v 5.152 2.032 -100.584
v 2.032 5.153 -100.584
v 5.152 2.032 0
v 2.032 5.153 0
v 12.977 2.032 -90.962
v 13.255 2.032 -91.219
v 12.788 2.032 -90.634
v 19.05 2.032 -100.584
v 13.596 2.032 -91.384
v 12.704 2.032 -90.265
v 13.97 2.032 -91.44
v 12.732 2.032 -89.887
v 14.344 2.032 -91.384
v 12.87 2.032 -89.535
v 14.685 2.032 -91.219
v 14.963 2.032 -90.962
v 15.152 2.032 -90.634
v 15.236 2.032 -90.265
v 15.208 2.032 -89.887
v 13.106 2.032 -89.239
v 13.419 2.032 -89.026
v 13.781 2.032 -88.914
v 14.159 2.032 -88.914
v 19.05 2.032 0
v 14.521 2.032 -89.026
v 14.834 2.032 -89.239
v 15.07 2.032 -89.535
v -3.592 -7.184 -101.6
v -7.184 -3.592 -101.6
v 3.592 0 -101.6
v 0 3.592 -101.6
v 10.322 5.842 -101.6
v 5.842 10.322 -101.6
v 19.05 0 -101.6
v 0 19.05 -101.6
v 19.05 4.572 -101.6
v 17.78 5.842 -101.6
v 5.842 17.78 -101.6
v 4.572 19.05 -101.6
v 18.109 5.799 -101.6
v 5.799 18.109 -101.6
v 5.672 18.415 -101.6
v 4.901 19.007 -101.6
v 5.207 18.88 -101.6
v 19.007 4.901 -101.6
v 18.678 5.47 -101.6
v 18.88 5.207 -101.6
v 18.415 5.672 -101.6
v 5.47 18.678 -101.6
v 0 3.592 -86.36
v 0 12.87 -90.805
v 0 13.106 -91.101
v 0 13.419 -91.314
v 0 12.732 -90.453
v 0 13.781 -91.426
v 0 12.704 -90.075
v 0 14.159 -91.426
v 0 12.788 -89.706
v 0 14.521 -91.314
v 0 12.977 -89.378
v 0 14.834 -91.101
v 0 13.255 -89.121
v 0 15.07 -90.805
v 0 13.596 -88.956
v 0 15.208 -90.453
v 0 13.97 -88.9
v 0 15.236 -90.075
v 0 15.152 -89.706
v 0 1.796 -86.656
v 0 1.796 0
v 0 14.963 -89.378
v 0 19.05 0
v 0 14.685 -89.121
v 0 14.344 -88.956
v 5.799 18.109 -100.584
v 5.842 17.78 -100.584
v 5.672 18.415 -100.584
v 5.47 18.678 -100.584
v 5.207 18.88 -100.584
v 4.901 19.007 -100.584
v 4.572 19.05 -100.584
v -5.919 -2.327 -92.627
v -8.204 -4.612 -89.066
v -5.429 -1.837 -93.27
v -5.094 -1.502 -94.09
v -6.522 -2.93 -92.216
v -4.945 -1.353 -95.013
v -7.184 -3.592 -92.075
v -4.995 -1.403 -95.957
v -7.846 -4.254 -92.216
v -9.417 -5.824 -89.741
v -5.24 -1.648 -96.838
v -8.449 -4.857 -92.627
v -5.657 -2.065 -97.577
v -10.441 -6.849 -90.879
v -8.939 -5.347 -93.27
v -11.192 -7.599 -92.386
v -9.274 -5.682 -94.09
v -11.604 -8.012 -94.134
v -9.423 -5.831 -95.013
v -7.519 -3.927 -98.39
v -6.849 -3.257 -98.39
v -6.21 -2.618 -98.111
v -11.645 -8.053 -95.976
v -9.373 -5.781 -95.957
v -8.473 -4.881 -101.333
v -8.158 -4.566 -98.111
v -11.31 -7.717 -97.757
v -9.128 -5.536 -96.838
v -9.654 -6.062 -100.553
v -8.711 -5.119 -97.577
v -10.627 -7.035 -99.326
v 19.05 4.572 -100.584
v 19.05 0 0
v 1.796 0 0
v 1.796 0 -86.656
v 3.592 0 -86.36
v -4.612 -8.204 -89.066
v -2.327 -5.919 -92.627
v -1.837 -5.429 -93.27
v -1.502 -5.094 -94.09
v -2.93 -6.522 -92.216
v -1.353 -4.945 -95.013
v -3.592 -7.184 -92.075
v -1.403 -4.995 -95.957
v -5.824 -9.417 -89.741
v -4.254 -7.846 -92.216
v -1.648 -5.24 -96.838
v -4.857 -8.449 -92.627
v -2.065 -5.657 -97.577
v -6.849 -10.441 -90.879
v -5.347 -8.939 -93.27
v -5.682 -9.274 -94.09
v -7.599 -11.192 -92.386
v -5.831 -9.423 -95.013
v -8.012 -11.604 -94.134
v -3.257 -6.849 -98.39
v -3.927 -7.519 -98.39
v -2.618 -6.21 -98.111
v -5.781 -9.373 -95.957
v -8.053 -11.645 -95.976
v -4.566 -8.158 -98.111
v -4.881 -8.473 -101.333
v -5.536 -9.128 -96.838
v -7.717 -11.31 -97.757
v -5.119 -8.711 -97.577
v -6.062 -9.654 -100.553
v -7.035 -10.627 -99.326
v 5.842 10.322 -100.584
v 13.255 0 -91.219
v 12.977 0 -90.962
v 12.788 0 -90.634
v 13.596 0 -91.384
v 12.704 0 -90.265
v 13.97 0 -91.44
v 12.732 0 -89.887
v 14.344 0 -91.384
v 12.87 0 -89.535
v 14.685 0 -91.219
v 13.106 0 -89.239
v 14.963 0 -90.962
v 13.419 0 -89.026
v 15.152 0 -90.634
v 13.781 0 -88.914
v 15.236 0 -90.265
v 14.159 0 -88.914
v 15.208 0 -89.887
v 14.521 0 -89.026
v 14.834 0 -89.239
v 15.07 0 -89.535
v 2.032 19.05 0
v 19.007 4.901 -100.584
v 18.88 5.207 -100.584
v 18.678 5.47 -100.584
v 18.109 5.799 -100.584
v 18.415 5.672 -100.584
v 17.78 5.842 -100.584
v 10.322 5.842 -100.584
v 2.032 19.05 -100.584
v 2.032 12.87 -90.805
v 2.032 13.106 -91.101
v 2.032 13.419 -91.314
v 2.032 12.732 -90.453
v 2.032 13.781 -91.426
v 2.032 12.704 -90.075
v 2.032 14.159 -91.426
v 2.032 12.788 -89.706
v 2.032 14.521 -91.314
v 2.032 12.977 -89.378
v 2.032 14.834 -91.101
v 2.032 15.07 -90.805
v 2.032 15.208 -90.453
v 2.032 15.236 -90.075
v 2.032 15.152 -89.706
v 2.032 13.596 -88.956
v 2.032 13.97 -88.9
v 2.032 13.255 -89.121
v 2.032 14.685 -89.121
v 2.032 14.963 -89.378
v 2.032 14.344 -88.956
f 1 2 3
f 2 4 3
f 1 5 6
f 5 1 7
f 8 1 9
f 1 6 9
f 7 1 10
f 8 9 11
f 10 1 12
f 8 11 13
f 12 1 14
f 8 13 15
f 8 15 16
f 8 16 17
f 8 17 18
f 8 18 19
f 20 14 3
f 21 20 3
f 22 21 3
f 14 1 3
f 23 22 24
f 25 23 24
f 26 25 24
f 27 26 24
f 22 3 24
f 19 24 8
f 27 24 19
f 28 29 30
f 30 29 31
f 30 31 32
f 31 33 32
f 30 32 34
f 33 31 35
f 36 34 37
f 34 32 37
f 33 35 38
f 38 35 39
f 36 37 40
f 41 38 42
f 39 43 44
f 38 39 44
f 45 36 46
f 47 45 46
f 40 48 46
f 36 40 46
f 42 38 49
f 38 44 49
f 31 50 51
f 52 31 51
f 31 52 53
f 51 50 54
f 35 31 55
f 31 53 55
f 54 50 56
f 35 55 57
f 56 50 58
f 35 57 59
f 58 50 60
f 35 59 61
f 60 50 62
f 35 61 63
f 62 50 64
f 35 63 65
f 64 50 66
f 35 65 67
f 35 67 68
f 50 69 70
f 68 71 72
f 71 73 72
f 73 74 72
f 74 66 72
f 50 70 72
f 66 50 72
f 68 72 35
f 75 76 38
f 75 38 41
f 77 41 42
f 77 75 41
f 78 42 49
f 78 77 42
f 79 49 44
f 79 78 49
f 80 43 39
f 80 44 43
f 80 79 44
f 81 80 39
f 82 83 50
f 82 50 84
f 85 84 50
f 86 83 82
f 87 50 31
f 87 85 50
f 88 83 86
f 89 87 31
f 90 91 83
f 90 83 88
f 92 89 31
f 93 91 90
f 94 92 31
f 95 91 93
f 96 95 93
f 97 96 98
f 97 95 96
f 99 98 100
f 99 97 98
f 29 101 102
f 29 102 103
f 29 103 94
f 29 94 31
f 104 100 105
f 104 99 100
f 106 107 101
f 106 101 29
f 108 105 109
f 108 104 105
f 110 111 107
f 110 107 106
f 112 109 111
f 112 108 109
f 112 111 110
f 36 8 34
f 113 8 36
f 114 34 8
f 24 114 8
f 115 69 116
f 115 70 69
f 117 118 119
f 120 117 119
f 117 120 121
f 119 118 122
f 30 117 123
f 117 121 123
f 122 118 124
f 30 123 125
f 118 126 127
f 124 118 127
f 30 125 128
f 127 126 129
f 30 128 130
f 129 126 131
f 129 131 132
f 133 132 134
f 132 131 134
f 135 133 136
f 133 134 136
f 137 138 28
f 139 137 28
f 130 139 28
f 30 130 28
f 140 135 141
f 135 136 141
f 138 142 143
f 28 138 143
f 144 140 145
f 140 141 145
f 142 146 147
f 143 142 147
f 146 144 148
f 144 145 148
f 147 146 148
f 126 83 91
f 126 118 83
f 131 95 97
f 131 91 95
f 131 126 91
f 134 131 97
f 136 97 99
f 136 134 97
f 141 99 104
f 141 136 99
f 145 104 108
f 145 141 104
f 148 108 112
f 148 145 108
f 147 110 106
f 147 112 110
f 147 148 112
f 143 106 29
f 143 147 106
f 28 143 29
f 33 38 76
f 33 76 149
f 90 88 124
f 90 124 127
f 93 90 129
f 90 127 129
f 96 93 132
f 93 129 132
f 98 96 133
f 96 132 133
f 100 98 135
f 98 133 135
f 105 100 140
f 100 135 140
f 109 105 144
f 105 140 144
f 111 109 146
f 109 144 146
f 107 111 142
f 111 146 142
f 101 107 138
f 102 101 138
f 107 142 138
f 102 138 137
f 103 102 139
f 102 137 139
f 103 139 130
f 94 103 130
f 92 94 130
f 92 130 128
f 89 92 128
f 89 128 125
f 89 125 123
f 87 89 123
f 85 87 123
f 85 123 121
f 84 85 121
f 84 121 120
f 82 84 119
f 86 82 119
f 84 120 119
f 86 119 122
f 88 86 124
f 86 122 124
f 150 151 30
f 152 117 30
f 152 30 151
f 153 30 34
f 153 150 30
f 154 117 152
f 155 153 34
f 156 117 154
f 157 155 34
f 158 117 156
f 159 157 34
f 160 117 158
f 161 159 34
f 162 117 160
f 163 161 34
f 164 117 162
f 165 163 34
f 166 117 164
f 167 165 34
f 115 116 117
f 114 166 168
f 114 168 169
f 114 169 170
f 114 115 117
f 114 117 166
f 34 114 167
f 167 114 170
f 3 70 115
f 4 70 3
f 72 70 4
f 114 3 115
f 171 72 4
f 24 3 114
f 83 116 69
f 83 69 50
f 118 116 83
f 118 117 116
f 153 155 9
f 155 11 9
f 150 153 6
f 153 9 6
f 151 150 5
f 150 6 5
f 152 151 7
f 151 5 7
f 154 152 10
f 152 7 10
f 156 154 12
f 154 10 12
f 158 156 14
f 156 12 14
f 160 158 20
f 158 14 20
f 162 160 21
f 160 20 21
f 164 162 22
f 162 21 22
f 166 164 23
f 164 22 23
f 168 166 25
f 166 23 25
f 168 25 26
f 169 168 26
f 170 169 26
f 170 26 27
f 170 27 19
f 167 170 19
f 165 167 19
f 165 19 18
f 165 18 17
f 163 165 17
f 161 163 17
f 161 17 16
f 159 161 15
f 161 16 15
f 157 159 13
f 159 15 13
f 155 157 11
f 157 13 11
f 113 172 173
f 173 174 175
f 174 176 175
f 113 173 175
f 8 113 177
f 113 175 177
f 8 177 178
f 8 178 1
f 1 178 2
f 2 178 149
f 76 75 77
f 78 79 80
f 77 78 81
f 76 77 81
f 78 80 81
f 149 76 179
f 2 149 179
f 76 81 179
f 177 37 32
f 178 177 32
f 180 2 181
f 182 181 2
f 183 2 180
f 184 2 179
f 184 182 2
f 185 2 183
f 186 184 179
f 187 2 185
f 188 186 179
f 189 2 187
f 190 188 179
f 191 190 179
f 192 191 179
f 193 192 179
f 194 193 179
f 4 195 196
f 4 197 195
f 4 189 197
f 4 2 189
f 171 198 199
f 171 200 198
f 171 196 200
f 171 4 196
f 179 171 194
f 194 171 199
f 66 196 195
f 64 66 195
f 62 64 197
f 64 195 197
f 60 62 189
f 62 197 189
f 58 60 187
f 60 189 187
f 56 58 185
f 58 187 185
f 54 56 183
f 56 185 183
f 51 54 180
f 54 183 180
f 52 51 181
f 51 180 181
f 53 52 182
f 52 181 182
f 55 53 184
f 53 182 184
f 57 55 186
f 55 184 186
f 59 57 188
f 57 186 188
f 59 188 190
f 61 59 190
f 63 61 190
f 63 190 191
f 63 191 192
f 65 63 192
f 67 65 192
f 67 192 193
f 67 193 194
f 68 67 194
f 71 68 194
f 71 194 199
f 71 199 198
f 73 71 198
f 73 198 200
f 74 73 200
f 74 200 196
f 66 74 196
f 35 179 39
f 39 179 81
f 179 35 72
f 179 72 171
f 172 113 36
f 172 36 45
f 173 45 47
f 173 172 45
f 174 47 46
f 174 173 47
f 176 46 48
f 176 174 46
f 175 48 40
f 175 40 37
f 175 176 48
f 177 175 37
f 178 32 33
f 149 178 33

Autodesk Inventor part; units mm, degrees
ref_plane "YZ Plane" through (0, 0, 0) normal (1, 0, 0) x (0, 1, 0)
ref_plane "XZ Plane" through (0, 0, 0) normal (0, 1, 0) x (-1, 0, 0)
sketch "Sketch1" plane through (0, 0, 0) normal (0, 0, 1) x (1, 0, 0)
  line L0 (1.7958, 0) -> (19.05, 0)
  line L1 (0, 1.7963) -> (0, 19.05)
  line L2 (0, 19.05) -> (2.032, 19.05)
  line L3 (19.05, 0) -> (19.05, 2.032)
  line L4 (0, 1.7963) -> (1.7958, 0)
  line L5 (0, 1.7963) -> (3.81, 1.7963) construction
  line L6 (5.1517, 2.032) -> (19.05, 2.032)
  line L7 (2.032, 5.1527) -> (2.032, 19.05)
  line L8 (2.032, 5.1527) -> (5.1517, 2.032)
  line L9 (19.05, 2.032) -> (2.032, 19.05) construction
  point P0 (0, 0)
  dimension "d0" = 19.05
  dimension "d1" = 19.05
  dimension "d2" = 2.032
  dimension "d3" = 2.032
  dimension "d8" = 3.81
  dimension "d73" = 2.54
  dimension "d74" = 17.2542
extrude "Extrusion1" add sketch "Sketch1" against normal blind 101.6
sketch "Sketch2" plane through (0, 0, -101.6) normal (0, 0, -1) x (-1, 0, 0)
  line L0 (-19.05, 0) -> (-1.7958, 0) projected
  line L1 (-19.05, 0) -> (-19.05, 5.842)
  line L2 (-19.05, 0) -> (-13.208, 0) construction
  line L3 (-19.05, 5.842) -> (-10.3222, 5.842)
  line L4 (0, 19.05) -> (-2.032, 19.05) projected
  line L5 (0, 19.05) -> (-5.842, 19.05)
  line L6 (0, 19.05) -> (5.842, 19.05) construction
  line L7 (-5.842, 19.05) -> (-5.842, 10.3222)
  line L8 (-16.4522, -0.288) -> (10.5221, -0.288) construction
  line L9 (0.0018, -0.288) -> (0.2898, 0)
  line L10 (-1.7958, 0) -> (0, 1.7958)
  line L11 (-1.7958, 0) -> (12.0118, 0) construction
  line L12 (-19.05, 0) -> (-1.7958, 0)
  line L13 (0, 1.7958) -> (0, 19.05)
  line L14 (-16.4522, -0.288) -> (-16.1642, 0)
  line L15 (-10.3222, 5.842) -> (-5.842, 10.3222)
  point P0 (0, 0)
  dimension "d11" = 5.842
  dimension "d15" = 5.842
  dimension "d16" = 180
  dimension "d18" = 90
  dimension "d20" = 45
  dimension "d75" = 10.16
extrude "Extrusion2" add sketch "Sketch2" against normal blind 1.016
sketch "Sketch3" plane through (1.7958, 0, 0) normal (-0.7072, -0.707, 0) x (-0.707, 0.7072, 0)
  line L0 (0, 101.6) -> (2.5396, 101.6) projected
  line L1 (1.7961, 101.6) -> (1.7961, 0) construction
  point P0 (1.2696, 0)
  point P1 (1.7961, 101.6)
ref_plane "Work Plane1" through (0, 0, 0) normal (-0.7071, 0.7071, 0) x (0, 0, -1)
sketch "Sketch5" plane through (0, 0, 0) normal (-0.7071, 0.7071, 0) x (0, 0, -1)
  line L0 (101.6, -13.4704) -> (101.6, -1.2698) projected
  line L1 (0, -1.2702) -> (101.6, -1.2702) projected
  line L2 (101.6, -2.5402) -> (86.36, -2.5402)
  line L3 (101.6, -2.5402) -> (116.84, -2.5402) construction
  arc A0 (101.6, 7.6198) -> (89.066, 9.0621) centre (95.25, 7.6198) ccw
  line L4 (101.6, -2.5402) -> (101.6, 7.6198)
  line L5 (86.36, -2.5402) -> (89.066, 9.0621)
  point P0 (0, 0)
  point P1 (95.25, -2.5402)
  dimension "d37" = 1.27
  dimension "d38" = 15.24
  dimension "d39" = 180
  dimension "d40" = 6.35
  dimension "d41" = 10.16
  dimension "d42" = 6.35
  dimension "d43" = 12.7
extrude "Extrusion4" add sketch "Sketch5" along normal mid plane 5.08
sketch "Sketch6" plane through (0, 0, -101.6) normal (0, 0, -1) x (-1, 0, 0)
  point P0 (0, 0)
sketch "Sketch7" plane through (-1.7961, 1.7961, 0) normal (-0.7071, 0.7071, 0) x (-0.7071, -0.7071, 0)
  line L0 (-2.54, -86.36) -> (9.0621, -89.066) projected
  line L1 (7.6198, -101.6) -> (-2.54, -101.6) projected
  arc A0 (9.0621, -89.066) -> (7.6198, -101.6) centre (7.6198, -95.25) ccw
  point P0 (0, 0)
  dimension "d46" = 6.35
hole "Hole1" at (-7.1841, -3.592, -95.25) direction (0.7071, -0.7071, 0) diameter 6.35 end through all
fillet "Fillet1" radius 1.27 2 edges at (5.842, 19.05, -101.092) (19.05, 5.842, -101.092)
sketch "Sketch8" plane through (0, 1.7963, 0) normal (-1, 0, 0) x (0, 0, 1)
  line L0 (0, 17.2537) -> (-101.6, 17.2537) projected
  line L1 (-101.6, 1.7958) -> (-101.6, 17.2537) projected
  point P0 (0, -1.7963)
  point P1 (-90.17, 12.1737)
  dimension "d55" = 5.08
  dimension "d56" = 11.43
hole "Hole2" at (0, 13.97, -90.17) direction (1, 0, 0) diameter 2.54 end through all
sketch "Sketch9" plane through (1.7958, 0, 0) normal (0, -1, 0) x (1, 0, 0)
  line L0 (17.2542, 0) -> (17.2542, -101.6) projected
  line L1 (17.2542, -101.6) -> (1.7963, -101.6) projected
  point P0 (-1.7958, 0)
  point P1 (12.1742, -90.17)
  dimension "d64" = 5.08
  dimension "d65" = 11.43
hole "Hole3" at (13.97, 0, -90.17) direction (0, 1, 0) diameter 2.54 end through all
sketch "Sketch10" plane through (0, 0, 0) normal (0, 0, 1) x (1, 0, 0)
  line L0 (19.05, 2.032) -> (5.1517, 2.032) projected
  line L1 (2.032, 5.1527) -> (2.032, 19.05) projected
  line L2 (19.05, 2.032) -> (2.032, 19.05) construction
  point P0 (0, 0)
properties part number "Lopez_CenterLeg"
